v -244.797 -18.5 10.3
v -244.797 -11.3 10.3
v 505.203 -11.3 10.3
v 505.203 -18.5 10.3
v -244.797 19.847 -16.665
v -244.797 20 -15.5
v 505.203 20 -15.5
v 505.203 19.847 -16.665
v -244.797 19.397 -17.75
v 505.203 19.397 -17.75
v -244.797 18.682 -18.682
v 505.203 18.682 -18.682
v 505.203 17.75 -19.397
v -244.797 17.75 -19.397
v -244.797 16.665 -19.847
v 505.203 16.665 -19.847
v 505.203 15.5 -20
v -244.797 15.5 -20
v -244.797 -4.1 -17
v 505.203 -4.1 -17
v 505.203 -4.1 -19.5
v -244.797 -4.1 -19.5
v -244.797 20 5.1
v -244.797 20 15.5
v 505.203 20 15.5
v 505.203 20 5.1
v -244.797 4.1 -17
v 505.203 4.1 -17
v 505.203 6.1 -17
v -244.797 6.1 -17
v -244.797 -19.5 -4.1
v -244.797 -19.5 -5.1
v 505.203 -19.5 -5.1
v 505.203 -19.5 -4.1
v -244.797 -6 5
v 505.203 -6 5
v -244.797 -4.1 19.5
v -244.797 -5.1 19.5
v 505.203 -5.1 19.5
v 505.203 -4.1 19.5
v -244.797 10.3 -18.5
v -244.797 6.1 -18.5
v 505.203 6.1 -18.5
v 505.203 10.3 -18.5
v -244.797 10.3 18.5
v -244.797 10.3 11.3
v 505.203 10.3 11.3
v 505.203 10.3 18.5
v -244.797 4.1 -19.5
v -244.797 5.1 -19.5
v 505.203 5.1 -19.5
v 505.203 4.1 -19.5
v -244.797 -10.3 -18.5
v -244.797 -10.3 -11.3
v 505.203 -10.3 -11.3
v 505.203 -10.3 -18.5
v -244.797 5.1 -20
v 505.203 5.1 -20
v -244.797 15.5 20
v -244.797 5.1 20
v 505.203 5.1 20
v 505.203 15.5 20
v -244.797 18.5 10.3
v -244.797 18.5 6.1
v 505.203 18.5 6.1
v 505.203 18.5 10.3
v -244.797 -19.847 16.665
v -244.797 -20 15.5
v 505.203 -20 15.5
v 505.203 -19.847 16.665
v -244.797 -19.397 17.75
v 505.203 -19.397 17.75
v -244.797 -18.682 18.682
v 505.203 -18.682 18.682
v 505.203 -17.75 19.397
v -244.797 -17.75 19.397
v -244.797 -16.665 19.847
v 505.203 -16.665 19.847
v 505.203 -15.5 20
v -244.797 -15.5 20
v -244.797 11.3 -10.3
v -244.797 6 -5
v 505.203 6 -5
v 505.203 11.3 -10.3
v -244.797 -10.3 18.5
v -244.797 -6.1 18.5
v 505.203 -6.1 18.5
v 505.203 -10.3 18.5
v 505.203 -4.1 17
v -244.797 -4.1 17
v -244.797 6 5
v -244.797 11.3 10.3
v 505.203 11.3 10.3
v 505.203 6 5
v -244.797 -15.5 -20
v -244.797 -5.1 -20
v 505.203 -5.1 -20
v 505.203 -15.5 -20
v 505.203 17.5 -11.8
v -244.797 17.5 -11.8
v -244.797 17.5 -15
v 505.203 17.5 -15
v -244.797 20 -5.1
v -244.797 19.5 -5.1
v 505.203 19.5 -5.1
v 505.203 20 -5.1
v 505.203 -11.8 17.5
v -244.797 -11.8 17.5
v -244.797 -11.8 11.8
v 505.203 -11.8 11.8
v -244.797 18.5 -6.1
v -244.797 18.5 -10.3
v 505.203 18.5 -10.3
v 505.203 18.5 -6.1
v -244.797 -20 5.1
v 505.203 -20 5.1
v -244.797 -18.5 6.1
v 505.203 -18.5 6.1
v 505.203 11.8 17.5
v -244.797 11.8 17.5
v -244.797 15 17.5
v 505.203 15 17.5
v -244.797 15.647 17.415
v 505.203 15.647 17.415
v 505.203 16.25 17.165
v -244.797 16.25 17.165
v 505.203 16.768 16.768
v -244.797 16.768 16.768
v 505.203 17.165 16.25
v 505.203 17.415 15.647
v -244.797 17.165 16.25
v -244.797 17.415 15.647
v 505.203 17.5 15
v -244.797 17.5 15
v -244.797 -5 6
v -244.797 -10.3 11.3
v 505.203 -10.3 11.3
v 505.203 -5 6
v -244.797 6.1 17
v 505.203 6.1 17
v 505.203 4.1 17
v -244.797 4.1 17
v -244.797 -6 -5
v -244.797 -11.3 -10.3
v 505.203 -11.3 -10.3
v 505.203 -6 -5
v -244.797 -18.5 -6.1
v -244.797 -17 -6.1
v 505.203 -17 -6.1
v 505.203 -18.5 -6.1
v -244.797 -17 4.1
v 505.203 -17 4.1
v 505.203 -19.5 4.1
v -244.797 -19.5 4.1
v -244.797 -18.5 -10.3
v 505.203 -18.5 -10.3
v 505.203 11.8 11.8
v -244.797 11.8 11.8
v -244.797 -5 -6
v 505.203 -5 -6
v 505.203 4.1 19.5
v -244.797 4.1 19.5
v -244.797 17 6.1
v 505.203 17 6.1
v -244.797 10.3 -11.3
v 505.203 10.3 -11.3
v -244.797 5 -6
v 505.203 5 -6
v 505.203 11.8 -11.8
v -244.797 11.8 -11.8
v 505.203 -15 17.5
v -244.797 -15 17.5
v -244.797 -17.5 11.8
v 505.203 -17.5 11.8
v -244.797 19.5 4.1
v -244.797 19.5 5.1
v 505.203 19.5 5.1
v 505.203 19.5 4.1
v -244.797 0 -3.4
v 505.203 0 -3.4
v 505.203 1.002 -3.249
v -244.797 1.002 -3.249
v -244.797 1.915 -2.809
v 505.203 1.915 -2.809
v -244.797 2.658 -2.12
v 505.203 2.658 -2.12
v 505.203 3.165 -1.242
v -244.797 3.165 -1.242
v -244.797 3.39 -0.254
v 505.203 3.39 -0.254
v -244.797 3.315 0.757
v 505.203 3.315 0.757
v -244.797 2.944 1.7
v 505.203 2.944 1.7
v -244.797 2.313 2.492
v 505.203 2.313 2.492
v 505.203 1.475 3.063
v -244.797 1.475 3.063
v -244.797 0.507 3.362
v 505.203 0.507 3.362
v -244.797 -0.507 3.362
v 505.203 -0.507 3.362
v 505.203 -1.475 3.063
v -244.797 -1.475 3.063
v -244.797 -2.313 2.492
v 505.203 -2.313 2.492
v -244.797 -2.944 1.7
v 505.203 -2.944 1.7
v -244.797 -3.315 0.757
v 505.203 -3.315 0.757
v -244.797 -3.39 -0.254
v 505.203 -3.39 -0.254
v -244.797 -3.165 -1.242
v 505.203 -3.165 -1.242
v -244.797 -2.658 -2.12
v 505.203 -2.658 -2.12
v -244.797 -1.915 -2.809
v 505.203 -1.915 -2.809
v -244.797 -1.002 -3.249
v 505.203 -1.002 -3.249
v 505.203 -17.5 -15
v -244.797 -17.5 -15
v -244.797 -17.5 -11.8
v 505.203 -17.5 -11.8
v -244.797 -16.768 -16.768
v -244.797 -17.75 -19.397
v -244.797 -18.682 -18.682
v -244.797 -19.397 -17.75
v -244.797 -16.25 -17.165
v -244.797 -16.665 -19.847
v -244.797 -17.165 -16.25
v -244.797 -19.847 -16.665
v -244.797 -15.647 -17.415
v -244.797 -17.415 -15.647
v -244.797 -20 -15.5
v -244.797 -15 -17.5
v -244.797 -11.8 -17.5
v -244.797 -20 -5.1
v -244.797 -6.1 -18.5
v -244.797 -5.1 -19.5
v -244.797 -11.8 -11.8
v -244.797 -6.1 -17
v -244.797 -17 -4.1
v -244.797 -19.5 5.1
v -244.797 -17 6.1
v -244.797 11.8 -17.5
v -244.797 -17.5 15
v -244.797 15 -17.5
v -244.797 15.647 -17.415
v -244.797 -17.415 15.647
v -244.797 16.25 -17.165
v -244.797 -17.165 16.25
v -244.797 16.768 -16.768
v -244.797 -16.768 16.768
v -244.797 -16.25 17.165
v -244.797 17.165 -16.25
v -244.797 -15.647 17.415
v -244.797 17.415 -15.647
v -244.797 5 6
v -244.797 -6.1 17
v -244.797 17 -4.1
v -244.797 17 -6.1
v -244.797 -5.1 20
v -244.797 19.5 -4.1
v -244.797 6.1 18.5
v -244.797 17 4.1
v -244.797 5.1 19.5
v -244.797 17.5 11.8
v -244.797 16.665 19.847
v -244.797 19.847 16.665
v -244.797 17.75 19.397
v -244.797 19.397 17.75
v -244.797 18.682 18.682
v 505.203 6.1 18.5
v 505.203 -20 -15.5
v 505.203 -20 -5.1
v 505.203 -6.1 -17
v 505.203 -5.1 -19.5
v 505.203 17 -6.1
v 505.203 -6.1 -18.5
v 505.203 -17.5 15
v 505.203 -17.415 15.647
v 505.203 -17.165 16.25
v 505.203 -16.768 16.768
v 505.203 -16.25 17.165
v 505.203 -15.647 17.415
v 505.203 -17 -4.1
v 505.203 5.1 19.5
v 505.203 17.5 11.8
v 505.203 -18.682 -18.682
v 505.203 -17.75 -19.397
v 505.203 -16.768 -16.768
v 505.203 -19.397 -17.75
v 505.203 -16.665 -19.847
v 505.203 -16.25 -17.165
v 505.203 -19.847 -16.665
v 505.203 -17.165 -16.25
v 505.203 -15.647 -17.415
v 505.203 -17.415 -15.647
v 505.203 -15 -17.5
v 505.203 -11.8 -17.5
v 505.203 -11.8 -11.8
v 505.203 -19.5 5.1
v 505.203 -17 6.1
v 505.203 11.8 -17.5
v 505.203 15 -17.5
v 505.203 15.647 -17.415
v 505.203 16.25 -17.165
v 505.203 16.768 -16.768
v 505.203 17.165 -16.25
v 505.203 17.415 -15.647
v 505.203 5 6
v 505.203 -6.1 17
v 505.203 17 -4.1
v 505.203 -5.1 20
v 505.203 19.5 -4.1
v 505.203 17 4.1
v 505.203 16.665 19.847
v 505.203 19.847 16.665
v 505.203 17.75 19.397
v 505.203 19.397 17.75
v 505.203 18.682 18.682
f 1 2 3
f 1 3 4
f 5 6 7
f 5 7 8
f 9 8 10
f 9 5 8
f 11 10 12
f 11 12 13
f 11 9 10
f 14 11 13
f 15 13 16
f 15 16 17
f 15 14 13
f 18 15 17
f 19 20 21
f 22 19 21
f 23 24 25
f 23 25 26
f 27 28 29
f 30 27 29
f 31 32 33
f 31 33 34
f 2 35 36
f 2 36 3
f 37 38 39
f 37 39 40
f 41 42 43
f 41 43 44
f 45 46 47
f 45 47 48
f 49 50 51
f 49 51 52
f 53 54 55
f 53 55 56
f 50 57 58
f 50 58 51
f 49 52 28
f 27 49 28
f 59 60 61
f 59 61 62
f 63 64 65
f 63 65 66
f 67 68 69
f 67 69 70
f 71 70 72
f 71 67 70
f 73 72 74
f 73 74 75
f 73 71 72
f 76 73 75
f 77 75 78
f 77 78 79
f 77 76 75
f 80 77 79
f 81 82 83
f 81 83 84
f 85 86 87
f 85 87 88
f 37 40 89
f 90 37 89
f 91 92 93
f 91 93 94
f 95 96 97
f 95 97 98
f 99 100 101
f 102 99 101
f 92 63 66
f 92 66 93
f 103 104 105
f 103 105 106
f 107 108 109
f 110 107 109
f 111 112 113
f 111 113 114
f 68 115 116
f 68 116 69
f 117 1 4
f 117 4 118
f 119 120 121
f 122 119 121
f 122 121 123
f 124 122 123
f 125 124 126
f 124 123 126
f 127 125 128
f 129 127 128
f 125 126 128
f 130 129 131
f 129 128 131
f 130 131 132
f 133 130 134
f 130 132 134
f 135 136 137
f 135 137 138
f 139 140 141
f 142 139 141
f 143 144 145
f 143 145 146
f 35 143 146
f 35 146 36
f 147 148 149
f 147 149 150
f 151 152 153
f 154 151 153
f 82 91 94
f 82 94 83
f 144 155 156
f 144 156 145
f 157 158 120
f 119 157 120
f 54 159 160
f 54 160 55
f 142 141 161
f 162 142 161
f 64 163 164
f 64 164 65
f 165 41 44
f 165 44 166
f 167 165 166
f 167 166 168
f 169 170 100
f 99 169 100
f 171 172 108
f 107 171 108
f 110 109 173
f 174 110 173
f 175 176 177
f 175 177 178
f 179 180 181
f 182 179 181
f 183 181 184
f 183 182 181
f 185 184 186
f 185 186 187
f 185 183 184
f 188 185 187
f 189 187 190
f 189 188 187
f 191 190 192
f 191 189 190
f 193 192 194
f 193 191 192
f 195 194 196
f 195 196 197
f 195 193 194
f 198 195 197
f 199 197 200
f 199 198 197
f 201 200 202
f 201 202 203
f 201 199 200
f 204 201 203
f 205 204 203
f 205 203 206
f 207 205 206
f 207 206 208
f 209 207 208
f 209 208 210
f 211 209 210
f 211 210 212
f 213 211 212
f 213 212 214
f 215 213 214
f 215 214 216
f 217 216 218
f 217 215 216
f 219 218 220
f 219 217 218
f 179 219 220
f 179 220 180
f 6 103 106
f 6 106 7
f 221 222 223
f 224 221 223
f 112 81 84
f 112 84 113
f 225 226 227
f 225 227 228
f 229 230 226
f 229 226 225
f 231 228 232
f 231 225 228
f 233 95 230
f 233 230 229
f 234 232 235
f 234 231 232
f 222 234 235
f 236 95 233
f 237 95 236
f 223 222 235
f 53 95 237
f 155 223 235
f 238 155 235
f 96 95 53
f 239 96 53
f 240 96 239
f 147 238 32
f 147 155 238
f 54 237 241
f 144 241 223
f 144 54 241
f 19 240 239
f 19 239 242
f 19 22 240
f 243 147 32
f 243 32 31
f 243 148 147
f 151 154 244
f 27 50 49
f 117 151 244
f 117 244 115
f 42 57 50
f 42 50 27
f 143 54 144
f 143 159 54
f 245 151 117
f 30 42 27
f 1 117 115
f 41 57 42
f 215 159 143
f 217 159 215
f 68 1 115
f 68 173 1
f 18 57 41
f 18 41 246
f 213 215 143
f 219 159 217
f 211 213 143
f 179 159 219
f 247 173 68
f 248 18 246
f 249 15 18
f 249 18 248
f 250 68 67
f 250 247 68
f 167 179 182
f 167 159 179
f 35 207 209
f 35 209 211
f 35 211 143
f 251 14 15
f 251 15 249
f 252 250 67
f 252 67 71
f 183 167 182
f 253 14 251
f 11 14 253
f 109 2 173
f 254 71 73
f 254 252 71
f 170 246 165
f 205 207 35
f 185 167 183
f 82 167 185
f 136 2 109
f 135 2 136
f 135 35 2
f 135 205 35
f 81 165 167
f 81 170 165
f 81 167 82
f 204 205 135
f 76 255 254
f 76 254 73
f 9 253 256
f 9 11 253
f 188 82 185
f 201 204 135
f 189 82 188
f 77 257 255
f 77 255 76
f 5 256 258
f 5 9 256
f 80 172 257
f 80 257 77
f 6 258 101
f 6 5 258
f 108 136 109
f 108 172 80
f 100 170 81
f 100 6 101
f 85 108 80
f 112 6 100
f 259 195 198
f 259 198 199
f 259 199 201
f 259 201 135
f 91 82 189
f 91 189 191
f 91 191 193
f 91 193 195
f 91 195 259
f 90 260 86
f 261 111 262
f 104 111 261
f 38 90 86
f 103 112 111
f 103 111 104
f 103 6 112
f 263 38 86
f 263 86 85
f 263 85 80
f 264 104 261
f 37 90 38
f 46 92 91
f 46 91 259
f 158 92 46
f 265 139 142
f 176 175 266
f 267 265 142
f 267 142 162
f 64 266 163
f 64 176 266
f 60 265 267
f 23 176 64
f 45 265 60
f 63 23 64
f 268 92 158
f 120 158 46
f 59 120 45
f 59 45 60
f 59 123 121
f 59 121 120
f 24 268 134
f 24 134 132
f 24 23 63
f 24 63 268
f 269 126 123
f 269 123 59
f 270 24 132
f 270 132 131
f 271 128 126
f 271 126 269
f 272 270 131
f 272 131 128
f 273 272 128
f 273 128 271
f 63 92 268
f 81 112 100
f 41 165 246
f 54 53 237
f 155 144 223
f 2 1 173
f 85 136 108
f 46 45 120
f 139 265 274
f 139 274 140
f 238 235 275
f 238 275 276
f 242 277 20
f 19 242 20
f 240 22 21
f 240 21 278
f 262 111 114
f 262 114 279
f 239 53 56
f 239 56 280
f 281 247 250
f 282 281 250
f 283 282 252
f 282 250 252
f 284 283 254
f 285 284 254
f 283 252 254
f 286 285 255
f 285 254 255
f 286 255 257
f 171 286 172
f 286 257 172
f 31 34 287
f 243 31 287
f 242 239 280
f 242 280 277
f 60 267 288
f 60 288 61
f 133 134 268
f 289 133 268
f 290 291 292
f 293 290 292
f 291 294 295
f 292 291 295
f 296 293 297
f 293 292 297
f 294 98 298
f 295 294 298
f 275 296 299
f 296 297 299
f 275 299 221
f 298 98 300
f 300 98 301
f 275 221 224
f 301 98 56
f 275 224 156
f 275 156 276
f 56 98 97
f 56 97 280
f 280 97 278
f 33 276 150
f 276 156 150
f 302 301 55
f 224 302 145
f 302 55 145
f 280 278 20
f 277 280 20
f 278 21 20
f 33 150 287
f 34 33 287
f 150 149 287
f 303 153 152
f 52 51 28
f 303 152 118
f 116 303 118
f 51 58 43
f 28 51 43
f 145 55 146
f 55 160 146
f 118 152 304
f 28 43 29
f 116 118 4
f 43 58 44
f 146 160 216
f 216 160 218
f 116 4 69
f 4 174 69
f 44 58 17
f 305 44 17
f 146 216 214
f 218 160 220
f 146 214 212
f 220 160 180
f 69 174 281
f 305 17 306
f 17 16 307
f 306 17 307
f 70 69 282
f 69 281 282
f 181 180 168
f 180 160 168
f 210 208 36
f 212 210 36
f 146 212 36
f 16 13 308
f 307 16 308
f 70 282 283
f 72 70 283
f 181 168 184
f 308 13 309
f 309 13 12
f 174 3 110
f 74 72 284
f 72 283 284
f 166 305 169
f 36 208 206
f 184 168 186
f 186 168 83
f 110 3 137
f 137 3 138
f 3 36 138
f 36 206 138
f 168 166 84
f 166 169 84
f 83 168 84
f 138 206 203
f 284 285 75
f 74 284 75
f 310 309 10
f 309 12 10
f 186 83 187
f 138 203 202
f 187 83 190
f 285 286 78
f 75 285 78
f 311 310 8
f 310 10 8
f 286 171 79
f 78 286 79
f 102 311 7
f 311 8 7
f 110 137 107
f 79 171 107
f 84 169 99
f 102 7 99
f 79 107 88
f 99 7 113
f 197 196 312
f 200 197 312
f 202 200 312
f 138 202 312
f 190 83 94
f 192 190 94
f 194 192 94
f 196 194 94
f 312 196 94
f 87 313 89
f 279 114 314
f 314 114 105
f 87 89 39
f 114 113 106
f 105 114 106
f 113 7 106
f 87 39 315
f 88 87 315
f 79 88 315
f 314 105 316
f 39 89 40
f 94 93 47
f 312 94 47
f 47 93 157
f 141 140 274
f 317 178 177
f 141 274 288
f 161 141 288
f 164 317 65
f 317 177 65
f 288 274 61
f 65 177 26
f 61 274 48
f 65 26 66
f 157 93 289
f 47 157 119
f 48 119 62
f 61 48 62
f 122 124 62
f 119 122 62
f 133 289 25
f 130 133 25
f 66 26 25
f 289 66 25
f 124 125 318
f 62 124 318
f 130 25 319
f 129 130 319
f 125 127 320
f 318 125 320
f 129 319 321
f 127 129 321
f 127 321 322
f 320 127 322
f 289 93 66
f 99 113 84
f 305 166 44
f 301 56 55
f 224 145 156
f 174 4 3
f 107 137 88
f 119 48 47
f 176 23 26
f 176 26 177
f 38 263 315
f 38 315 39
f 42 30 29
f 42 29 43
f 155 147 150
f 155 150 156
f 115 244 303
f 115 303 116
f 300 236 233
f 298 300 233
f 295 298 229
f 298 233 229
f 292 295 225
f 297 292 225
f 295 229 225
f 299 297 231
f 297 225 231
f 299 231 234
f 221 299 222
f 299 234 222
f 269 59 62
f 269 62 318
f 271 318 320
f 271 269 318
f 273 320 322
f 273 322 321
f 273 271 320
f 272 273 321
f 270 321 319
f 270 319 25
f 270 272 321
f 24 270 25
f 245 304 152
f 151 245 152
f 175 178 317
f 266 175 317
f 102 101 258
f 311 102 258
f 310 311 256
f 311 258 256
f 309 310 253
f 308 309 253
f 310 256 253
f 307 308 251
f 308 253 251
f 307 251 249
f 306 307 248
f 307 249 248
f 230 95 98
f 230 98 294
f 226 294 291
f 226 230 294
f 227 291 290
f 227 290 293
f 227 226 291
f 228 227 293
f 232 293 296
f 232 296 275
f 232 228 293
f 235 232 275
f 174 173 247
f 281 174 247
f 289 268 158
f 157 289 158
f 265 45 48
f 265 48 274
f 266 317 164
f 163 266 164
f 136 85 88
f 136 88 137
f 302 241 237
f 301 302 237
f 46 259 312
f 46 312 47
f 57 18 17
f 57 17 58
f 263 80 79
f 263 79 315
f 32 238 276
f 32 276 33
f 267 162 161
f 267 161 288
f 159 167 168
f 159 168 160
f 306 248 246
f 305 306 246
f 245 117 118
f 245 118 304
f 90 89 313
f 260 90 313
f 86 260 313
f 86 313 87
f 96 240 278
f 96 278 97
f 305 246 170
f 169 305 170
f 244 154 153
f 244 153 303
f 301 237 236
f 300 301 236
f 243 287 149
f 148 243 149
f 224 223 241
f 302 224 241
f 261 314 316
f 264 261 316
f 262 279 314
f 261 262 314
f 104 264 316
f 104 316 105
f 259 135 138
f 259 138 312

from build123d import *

# Parameters (mm, degrees)
SKETCH1_R                 = 3.4
F_40_X_40L_X_R4_5_1_DEPTH = 750


with BuildPart() as part:
    # Sketch1 → 铝型材 40 X 40L X R4.5(1) (new body)
    with BuildSketch(Plane(origin=(-244.796828543, 0, 0), x_dir=(0, 0, -1), z_dir=(1, 0, 0))):
        with BuildLine():
            Line((-5.1, 20), (-5.1, 19.5))
            Line((-5.1, 19.5), (-4.1, 19.5))
            Line((-4.1, 19.5), (-4.1, 17))
            Line((-4.1, 17), (-6.1, 17))
            Line((-6.1, 17), (-6.1, 18.5))
            Line((-6.1, 18.5), (-10.3, 18.5))
            Line((-10.3, 18.5), (-10.3, 11.3))
            Line((-10.3, 11.3), (-5, 6))
            Line((-5, 6), (5, 6))
            Line((5, 6), (10.3, 11.3))
            Line((10.3, 11.3), (10.3, 18.5))
            Line((10.3, 18.5), (6.1, 18.5))
            Line((6.1, 18.5), (6.1, 17))
            Line((6.1, 17), (4.1, 17))
            Line((4.1, 17), (4.1, 19.5))
            Line((4.1, 19.5), (5.1, 19.5))
            Line((5.1, 19.5), (5.1, 20))
            Line((5.1, 20), (15.5, 20))
            ThreePointArc((15.5, 20), (18.681980515, 18.681980515), (20, 15.5))
            Line((20, 15.5), (20, 5.1))
            Line((20, 5.1), (19.5, 5.1))
            Line((19.5, 5.1), (19.5, 4.1))
            Line((19.5, 4.1), (17, 4.1))
            Line((17, 4.1), (17, 6.1))
            Line((17, 6.1), (18.5, 6.1))
            Line((18.5, 6.1), (18.5, 10.3))
            Line((18.5, 10.3), (11.3, 10.3))
            Line((11.3, 10.3), (6, 5))
            Line((6, 5), (6, -5))
            Line((6, -5), (11.3, -10.3))
            Line((11.3, -10.3), (18.5, -10.3))
            Line((18.5, -10.3), (18.5, -6.1))
            Line((18.5, -6.1), (17, -6.1))
            Line((17, -6.1), (17, -4.1))
            Line((17, -4.1), (19.5, -4.1))
            Line((19.5, -4.1), (19.5, -5.1))
            Line((19.5, -5.1), (20, -5.1))
            Line((20, -5.1), (20, -15.5))
            ThreePointArc((20, -15.5), (18.681980515, -18.681980515), (15.5, -20))
            Line((15.5, -20), (5.1, -20))
            Line((5.1, -20), (5.1, -19.5))
            Line((5.1, -19.5), (4.1, -19.5))
            Line((4.1, -19.5), (4.1, -17))
            Line((4.1, -17), (6.1, -17))
            Line((6.1, -17), (6.1, -18.5))
            Line((6.1, -18.5), (10.3, -18.5))
            Line((10.3, -18.5), (10.3, -11.3))
            Line((10.3, -11.3), (5, -6))
            Line((5, -6), (-5, -6))
            Line((-5, -6), (-10.3, -11.3))
            Line((-10.3, -11.3), (-10.3, -18.5))
            Line((-10.3, -18.5), (-6.1, -18.5))
            Line((-6.1, -18.5), (-6.1, -17))
            Line((-6.1, -17), (-4.1, -17))
            Line((-4.1, -17), (-4.1, -19.5))
            Line((-4.1, -19.5), (-5.1, -19.5))
            Line((-5.1, -19.5), (-5.1, -20))
            Line((-5.1, -20), (-15.5, -20))
            ThreePointArc((-15.5, -20), (-18.681980515, -18.681980515), (-20, -15.5))
            Line((-20, -15.5), (-20, -5.1))
            Line((-20, -5.1), (-19.5, -5.1))
            Line((-19.5, -5.1), (-19.5, -4.1))
            Line((-19.5, -4.1), (-17, -4.1))
            Line((-17, -4.1), (-17, -6.1))
            Line((-17, -6.1), (-18.5, -6.1))
            Line((-18.5, -6.1), (-18.5, -10.3))
            Line((-18.5, -10.3), (-11.3, -10.3))
            Line((-11.3, -10.3), (-6, -5))
            Line((-6, -5), (-6, 5))
            Line((-6, 5), (-11.3, 10.3))
            Line((-11.3, 10.3), (-18.5, 10.3))
            Line((-18.5, 10.3), (-18.5, 6.1))
            Line((-18.5, 6.1), (-17, 6.1))
            Line((-17, 6.1), (-17, 4.1))
            Line((-17, 4.1), (-19.5, 4.1))
            Line((-19.5, 4.1), (-19.5, 5.1))
            Line((-19.5, 5.1), (-20, 5.1))
            Line((-20, 5.1), (-20, 15.5))
            ThreePointArc((-20, 15.5), (-18.681980515, 18.681980515), (-15.5, 20))
            Line((-15.5, 20), (-5.1, 20))
        make_face()
        Circle(SKETCH1_R, mode=Mode.SUBTRACT)
        with BuildLine():
            Line((11.8, 17.5), (15, 17.5))
            ThreePointArc((15, 17.5), (16.767766953, 16.767766953), (17.5, 15))
            Line((17.5, 15), (17.5, 11.8))
            Line((17.5, 11.8), (11.8, 11.8))
            Line((11.8, 11.8), (11.8, 17.5))
        make_face(mode=Mode.SUBTRACT)
        with BuildLine():
            Line((-15, 17.5), (-11.8, 17.5))
            Line((-11.8, 17.5), (-11.8, 11.8))
            Line((-11.8, 11.8), (-17.5, 11.8))
            Line((-17.5, 11.8), (-17.5, 15))
            ThreePointArc((-17.5, 15), (-16.767766953, 16.767766953), (-15, 17.5))
        make_face(mode=Mode.SUBTRACT)
        with BuildLine():
            Line((-17.5, -11.8), (-11.8, -11.8))
            Line((-11.8, -11.8), (-11.8, -17.5))
            Line((-11.8, -17.5), (-15, -17.5))
            ThreePointArc((-15, -17.5), (-16.767766953, -16.767766953), (-17.5, -15))
            Line((-17.5, -15), (-17.5, -11.8))
        make_face(mode=Mode.SUBTRACT)
        with BuildLine():
            Line((11.8, -11.8), (17.5, -11.8))
            Line((17.5, -11.8), (17.5, -15))
            ThreePointArc((17.5, -15), (16.767766953, -16.767766953), (15, -17.5))
            Line((15, -17.5), (11.8, -17.5))
            Line((11.8, -17.5), (11.8, -11.8))
        make_face(mode=Mode.SUBTRACT)
    extrude(amount=F_40_X_40L_X_R4_5_1_DEPTH)


solid = part.part
